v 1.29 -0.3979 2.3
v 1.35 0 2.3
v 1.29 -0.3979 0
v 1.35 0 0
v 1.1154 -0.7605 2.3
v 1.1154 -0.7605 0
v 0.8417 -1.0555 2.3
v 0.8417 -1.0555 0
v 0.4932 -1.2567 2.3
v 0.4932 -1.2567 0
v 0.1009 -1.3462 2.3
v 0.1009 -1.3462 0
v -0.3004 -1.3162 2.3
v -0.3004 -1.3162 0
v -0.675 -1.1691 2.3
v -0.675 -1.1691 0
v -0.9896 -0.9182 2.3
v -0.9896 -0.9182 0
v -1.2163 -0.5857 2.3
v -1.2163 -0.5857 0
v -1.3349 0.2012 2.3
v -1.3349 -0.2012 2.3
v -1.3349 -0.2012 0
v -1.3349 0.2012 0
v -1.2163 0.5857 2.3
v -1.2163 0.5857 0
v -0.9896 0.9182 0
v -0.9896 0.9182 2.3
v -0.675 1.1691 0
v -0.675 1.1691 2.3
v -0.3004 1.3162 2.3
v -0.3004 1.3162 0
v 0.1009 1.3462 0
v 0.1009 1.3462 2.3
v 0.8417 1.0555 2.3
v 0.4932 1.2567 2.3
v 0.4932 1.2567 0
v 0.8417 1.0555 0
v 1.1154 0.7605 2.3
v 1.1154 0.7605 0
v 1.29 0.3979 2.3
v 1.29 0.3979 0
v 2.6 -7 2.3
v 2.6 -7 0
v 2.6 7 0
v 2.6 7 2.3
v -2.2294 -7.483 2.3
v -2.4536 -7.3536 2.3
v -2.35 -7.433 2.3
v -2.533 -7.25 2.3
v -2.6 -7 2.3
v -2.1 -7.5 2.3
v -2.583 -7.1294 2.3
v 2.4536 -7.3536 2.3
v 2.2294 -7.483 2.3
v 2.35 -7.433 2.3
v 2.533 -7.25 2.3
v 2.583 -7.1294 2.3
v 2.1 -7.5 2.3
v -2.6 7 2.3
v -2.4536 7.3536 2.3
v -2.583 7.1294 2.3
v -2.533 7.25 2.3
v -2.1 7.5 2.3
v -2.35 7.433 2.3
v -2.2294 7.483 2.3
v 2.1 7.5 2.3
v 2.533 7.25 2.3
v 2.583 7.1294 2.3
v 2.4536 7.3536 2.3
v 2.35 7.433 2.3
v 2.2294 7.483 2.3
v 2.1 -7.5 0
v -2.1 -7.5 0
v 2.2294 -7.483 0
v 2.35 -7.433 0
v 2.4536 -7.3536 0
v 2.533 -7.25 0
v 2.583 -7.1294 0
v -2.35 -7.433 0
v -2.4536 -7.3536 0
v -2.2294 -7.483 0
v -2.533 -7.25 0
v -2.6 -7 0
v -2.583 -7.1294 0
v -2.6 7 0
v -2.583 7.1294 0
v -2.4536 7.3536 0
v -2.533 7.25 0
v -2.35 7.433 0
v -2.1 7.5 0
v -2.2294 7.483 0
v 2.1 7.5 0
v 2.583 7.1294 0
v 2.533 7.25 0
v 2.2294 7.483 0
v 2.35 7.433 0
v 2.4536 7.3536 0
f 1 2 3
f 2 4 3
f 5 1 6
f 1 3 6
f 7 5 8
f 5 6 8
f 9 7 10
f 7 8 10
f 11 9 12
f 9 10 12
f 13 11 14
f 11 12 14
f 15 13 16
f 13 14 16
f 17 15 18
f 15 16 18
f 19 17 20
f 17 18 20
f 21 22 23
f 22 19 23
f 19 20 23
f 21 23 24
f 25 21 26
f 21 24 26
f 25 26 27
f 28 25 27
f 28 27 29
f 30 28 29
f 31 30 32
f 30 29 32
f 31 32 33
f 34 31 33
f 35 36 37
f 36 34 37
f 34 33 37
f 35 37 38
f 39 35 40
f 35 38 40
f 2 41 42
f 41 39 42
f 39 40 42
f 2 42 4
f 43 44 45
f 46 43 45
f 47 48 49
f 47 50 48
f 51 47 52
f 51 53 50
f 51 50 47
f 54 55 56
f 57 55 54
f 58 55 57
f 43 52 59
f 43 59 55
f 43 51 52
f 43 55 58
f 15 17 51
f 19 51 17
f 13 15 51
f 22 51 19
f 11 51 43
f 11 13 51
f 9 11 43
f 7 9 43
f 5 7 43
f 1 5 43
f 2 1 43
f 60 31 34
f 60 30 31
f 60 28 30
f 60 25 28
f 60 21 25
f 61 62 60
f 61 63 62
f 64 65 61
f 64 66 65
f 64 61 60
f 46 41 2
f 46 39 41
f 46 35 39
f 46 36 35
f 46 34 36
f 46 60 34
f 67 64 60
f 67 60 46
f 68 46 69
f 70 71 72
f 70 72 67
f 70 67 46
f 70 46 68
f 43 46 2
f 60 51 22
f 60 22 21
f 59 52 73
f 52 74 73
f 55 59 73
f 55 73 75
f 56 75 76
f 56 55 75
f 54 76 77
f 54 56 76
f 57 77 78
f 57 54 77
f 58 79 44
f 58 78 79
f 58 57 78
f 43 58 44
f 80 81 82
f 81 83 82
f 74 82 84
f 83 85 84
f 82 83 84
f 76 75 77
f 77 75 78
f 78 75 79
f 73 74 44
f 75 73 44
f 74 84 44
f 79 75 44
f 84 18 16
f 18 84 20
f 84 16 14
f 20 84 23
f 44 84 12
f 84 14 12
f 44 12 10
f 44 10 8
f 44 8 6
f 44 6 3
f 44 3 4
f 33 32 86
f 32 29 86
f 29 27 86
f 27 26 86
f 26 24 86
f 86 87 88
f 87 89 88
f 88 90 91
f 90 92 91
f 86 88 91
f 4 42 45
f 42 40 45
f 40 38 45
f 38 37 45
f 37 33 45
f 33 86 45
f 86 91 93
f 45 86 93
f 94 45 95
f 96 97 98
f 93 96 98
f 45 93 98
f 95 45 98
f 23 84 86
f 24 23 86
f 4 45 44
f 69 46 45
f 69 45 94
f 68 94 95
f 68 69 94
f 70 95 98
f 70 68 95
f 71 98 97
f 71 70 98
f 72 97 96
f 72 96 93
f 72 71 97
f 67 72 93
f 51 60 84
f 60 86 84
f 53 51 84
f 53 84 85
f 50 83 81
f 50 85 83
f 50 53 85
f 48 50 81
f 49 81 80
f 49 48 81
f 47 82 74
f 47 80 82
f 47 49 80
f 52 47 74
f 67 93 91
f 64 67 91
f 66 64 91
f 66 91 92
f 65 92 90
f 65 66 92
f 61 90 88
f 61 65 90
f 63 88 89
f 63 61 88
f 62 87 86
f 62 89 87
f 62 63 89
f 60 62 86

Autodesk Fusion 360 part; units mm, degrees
sketch "Sketch1" plane through (0, 0, 0) normal (0, 0, 1) x (1, 0, 0)
  line L0 (2.6, 7.5) -> (-2.6, 7.5)
  line L1 (-2.6, 7.5) -> (-2.6, -7.5)
  line L2 (-2.6, -7.5) -> (2.6, -7.5)
  line L3 (2.6, -7.5) -> (2.6, 7.5)
  line L4 (2.6, 7.5) -> (-2.6, -7.5) construction
  line L5 (-2.6, 7.5) -> (2.6, -7.5) construction
  circle A0 centre (0, 0) radius 1.35
  dimension "d1" = 5.2
  dimension "d2" = 15
  dimension "d3" = 2.7
extrude "Extrude1" add sketch "Sketch1" along normal blind 2.3
fillet "Fillet1" radius 0.5 4 edges at (2.6, 7.5, 1.15) (-2.6, 7.5, 1.15) (-2.6, -7.5, 1.15) (2.6, -7.5, 1.15)
